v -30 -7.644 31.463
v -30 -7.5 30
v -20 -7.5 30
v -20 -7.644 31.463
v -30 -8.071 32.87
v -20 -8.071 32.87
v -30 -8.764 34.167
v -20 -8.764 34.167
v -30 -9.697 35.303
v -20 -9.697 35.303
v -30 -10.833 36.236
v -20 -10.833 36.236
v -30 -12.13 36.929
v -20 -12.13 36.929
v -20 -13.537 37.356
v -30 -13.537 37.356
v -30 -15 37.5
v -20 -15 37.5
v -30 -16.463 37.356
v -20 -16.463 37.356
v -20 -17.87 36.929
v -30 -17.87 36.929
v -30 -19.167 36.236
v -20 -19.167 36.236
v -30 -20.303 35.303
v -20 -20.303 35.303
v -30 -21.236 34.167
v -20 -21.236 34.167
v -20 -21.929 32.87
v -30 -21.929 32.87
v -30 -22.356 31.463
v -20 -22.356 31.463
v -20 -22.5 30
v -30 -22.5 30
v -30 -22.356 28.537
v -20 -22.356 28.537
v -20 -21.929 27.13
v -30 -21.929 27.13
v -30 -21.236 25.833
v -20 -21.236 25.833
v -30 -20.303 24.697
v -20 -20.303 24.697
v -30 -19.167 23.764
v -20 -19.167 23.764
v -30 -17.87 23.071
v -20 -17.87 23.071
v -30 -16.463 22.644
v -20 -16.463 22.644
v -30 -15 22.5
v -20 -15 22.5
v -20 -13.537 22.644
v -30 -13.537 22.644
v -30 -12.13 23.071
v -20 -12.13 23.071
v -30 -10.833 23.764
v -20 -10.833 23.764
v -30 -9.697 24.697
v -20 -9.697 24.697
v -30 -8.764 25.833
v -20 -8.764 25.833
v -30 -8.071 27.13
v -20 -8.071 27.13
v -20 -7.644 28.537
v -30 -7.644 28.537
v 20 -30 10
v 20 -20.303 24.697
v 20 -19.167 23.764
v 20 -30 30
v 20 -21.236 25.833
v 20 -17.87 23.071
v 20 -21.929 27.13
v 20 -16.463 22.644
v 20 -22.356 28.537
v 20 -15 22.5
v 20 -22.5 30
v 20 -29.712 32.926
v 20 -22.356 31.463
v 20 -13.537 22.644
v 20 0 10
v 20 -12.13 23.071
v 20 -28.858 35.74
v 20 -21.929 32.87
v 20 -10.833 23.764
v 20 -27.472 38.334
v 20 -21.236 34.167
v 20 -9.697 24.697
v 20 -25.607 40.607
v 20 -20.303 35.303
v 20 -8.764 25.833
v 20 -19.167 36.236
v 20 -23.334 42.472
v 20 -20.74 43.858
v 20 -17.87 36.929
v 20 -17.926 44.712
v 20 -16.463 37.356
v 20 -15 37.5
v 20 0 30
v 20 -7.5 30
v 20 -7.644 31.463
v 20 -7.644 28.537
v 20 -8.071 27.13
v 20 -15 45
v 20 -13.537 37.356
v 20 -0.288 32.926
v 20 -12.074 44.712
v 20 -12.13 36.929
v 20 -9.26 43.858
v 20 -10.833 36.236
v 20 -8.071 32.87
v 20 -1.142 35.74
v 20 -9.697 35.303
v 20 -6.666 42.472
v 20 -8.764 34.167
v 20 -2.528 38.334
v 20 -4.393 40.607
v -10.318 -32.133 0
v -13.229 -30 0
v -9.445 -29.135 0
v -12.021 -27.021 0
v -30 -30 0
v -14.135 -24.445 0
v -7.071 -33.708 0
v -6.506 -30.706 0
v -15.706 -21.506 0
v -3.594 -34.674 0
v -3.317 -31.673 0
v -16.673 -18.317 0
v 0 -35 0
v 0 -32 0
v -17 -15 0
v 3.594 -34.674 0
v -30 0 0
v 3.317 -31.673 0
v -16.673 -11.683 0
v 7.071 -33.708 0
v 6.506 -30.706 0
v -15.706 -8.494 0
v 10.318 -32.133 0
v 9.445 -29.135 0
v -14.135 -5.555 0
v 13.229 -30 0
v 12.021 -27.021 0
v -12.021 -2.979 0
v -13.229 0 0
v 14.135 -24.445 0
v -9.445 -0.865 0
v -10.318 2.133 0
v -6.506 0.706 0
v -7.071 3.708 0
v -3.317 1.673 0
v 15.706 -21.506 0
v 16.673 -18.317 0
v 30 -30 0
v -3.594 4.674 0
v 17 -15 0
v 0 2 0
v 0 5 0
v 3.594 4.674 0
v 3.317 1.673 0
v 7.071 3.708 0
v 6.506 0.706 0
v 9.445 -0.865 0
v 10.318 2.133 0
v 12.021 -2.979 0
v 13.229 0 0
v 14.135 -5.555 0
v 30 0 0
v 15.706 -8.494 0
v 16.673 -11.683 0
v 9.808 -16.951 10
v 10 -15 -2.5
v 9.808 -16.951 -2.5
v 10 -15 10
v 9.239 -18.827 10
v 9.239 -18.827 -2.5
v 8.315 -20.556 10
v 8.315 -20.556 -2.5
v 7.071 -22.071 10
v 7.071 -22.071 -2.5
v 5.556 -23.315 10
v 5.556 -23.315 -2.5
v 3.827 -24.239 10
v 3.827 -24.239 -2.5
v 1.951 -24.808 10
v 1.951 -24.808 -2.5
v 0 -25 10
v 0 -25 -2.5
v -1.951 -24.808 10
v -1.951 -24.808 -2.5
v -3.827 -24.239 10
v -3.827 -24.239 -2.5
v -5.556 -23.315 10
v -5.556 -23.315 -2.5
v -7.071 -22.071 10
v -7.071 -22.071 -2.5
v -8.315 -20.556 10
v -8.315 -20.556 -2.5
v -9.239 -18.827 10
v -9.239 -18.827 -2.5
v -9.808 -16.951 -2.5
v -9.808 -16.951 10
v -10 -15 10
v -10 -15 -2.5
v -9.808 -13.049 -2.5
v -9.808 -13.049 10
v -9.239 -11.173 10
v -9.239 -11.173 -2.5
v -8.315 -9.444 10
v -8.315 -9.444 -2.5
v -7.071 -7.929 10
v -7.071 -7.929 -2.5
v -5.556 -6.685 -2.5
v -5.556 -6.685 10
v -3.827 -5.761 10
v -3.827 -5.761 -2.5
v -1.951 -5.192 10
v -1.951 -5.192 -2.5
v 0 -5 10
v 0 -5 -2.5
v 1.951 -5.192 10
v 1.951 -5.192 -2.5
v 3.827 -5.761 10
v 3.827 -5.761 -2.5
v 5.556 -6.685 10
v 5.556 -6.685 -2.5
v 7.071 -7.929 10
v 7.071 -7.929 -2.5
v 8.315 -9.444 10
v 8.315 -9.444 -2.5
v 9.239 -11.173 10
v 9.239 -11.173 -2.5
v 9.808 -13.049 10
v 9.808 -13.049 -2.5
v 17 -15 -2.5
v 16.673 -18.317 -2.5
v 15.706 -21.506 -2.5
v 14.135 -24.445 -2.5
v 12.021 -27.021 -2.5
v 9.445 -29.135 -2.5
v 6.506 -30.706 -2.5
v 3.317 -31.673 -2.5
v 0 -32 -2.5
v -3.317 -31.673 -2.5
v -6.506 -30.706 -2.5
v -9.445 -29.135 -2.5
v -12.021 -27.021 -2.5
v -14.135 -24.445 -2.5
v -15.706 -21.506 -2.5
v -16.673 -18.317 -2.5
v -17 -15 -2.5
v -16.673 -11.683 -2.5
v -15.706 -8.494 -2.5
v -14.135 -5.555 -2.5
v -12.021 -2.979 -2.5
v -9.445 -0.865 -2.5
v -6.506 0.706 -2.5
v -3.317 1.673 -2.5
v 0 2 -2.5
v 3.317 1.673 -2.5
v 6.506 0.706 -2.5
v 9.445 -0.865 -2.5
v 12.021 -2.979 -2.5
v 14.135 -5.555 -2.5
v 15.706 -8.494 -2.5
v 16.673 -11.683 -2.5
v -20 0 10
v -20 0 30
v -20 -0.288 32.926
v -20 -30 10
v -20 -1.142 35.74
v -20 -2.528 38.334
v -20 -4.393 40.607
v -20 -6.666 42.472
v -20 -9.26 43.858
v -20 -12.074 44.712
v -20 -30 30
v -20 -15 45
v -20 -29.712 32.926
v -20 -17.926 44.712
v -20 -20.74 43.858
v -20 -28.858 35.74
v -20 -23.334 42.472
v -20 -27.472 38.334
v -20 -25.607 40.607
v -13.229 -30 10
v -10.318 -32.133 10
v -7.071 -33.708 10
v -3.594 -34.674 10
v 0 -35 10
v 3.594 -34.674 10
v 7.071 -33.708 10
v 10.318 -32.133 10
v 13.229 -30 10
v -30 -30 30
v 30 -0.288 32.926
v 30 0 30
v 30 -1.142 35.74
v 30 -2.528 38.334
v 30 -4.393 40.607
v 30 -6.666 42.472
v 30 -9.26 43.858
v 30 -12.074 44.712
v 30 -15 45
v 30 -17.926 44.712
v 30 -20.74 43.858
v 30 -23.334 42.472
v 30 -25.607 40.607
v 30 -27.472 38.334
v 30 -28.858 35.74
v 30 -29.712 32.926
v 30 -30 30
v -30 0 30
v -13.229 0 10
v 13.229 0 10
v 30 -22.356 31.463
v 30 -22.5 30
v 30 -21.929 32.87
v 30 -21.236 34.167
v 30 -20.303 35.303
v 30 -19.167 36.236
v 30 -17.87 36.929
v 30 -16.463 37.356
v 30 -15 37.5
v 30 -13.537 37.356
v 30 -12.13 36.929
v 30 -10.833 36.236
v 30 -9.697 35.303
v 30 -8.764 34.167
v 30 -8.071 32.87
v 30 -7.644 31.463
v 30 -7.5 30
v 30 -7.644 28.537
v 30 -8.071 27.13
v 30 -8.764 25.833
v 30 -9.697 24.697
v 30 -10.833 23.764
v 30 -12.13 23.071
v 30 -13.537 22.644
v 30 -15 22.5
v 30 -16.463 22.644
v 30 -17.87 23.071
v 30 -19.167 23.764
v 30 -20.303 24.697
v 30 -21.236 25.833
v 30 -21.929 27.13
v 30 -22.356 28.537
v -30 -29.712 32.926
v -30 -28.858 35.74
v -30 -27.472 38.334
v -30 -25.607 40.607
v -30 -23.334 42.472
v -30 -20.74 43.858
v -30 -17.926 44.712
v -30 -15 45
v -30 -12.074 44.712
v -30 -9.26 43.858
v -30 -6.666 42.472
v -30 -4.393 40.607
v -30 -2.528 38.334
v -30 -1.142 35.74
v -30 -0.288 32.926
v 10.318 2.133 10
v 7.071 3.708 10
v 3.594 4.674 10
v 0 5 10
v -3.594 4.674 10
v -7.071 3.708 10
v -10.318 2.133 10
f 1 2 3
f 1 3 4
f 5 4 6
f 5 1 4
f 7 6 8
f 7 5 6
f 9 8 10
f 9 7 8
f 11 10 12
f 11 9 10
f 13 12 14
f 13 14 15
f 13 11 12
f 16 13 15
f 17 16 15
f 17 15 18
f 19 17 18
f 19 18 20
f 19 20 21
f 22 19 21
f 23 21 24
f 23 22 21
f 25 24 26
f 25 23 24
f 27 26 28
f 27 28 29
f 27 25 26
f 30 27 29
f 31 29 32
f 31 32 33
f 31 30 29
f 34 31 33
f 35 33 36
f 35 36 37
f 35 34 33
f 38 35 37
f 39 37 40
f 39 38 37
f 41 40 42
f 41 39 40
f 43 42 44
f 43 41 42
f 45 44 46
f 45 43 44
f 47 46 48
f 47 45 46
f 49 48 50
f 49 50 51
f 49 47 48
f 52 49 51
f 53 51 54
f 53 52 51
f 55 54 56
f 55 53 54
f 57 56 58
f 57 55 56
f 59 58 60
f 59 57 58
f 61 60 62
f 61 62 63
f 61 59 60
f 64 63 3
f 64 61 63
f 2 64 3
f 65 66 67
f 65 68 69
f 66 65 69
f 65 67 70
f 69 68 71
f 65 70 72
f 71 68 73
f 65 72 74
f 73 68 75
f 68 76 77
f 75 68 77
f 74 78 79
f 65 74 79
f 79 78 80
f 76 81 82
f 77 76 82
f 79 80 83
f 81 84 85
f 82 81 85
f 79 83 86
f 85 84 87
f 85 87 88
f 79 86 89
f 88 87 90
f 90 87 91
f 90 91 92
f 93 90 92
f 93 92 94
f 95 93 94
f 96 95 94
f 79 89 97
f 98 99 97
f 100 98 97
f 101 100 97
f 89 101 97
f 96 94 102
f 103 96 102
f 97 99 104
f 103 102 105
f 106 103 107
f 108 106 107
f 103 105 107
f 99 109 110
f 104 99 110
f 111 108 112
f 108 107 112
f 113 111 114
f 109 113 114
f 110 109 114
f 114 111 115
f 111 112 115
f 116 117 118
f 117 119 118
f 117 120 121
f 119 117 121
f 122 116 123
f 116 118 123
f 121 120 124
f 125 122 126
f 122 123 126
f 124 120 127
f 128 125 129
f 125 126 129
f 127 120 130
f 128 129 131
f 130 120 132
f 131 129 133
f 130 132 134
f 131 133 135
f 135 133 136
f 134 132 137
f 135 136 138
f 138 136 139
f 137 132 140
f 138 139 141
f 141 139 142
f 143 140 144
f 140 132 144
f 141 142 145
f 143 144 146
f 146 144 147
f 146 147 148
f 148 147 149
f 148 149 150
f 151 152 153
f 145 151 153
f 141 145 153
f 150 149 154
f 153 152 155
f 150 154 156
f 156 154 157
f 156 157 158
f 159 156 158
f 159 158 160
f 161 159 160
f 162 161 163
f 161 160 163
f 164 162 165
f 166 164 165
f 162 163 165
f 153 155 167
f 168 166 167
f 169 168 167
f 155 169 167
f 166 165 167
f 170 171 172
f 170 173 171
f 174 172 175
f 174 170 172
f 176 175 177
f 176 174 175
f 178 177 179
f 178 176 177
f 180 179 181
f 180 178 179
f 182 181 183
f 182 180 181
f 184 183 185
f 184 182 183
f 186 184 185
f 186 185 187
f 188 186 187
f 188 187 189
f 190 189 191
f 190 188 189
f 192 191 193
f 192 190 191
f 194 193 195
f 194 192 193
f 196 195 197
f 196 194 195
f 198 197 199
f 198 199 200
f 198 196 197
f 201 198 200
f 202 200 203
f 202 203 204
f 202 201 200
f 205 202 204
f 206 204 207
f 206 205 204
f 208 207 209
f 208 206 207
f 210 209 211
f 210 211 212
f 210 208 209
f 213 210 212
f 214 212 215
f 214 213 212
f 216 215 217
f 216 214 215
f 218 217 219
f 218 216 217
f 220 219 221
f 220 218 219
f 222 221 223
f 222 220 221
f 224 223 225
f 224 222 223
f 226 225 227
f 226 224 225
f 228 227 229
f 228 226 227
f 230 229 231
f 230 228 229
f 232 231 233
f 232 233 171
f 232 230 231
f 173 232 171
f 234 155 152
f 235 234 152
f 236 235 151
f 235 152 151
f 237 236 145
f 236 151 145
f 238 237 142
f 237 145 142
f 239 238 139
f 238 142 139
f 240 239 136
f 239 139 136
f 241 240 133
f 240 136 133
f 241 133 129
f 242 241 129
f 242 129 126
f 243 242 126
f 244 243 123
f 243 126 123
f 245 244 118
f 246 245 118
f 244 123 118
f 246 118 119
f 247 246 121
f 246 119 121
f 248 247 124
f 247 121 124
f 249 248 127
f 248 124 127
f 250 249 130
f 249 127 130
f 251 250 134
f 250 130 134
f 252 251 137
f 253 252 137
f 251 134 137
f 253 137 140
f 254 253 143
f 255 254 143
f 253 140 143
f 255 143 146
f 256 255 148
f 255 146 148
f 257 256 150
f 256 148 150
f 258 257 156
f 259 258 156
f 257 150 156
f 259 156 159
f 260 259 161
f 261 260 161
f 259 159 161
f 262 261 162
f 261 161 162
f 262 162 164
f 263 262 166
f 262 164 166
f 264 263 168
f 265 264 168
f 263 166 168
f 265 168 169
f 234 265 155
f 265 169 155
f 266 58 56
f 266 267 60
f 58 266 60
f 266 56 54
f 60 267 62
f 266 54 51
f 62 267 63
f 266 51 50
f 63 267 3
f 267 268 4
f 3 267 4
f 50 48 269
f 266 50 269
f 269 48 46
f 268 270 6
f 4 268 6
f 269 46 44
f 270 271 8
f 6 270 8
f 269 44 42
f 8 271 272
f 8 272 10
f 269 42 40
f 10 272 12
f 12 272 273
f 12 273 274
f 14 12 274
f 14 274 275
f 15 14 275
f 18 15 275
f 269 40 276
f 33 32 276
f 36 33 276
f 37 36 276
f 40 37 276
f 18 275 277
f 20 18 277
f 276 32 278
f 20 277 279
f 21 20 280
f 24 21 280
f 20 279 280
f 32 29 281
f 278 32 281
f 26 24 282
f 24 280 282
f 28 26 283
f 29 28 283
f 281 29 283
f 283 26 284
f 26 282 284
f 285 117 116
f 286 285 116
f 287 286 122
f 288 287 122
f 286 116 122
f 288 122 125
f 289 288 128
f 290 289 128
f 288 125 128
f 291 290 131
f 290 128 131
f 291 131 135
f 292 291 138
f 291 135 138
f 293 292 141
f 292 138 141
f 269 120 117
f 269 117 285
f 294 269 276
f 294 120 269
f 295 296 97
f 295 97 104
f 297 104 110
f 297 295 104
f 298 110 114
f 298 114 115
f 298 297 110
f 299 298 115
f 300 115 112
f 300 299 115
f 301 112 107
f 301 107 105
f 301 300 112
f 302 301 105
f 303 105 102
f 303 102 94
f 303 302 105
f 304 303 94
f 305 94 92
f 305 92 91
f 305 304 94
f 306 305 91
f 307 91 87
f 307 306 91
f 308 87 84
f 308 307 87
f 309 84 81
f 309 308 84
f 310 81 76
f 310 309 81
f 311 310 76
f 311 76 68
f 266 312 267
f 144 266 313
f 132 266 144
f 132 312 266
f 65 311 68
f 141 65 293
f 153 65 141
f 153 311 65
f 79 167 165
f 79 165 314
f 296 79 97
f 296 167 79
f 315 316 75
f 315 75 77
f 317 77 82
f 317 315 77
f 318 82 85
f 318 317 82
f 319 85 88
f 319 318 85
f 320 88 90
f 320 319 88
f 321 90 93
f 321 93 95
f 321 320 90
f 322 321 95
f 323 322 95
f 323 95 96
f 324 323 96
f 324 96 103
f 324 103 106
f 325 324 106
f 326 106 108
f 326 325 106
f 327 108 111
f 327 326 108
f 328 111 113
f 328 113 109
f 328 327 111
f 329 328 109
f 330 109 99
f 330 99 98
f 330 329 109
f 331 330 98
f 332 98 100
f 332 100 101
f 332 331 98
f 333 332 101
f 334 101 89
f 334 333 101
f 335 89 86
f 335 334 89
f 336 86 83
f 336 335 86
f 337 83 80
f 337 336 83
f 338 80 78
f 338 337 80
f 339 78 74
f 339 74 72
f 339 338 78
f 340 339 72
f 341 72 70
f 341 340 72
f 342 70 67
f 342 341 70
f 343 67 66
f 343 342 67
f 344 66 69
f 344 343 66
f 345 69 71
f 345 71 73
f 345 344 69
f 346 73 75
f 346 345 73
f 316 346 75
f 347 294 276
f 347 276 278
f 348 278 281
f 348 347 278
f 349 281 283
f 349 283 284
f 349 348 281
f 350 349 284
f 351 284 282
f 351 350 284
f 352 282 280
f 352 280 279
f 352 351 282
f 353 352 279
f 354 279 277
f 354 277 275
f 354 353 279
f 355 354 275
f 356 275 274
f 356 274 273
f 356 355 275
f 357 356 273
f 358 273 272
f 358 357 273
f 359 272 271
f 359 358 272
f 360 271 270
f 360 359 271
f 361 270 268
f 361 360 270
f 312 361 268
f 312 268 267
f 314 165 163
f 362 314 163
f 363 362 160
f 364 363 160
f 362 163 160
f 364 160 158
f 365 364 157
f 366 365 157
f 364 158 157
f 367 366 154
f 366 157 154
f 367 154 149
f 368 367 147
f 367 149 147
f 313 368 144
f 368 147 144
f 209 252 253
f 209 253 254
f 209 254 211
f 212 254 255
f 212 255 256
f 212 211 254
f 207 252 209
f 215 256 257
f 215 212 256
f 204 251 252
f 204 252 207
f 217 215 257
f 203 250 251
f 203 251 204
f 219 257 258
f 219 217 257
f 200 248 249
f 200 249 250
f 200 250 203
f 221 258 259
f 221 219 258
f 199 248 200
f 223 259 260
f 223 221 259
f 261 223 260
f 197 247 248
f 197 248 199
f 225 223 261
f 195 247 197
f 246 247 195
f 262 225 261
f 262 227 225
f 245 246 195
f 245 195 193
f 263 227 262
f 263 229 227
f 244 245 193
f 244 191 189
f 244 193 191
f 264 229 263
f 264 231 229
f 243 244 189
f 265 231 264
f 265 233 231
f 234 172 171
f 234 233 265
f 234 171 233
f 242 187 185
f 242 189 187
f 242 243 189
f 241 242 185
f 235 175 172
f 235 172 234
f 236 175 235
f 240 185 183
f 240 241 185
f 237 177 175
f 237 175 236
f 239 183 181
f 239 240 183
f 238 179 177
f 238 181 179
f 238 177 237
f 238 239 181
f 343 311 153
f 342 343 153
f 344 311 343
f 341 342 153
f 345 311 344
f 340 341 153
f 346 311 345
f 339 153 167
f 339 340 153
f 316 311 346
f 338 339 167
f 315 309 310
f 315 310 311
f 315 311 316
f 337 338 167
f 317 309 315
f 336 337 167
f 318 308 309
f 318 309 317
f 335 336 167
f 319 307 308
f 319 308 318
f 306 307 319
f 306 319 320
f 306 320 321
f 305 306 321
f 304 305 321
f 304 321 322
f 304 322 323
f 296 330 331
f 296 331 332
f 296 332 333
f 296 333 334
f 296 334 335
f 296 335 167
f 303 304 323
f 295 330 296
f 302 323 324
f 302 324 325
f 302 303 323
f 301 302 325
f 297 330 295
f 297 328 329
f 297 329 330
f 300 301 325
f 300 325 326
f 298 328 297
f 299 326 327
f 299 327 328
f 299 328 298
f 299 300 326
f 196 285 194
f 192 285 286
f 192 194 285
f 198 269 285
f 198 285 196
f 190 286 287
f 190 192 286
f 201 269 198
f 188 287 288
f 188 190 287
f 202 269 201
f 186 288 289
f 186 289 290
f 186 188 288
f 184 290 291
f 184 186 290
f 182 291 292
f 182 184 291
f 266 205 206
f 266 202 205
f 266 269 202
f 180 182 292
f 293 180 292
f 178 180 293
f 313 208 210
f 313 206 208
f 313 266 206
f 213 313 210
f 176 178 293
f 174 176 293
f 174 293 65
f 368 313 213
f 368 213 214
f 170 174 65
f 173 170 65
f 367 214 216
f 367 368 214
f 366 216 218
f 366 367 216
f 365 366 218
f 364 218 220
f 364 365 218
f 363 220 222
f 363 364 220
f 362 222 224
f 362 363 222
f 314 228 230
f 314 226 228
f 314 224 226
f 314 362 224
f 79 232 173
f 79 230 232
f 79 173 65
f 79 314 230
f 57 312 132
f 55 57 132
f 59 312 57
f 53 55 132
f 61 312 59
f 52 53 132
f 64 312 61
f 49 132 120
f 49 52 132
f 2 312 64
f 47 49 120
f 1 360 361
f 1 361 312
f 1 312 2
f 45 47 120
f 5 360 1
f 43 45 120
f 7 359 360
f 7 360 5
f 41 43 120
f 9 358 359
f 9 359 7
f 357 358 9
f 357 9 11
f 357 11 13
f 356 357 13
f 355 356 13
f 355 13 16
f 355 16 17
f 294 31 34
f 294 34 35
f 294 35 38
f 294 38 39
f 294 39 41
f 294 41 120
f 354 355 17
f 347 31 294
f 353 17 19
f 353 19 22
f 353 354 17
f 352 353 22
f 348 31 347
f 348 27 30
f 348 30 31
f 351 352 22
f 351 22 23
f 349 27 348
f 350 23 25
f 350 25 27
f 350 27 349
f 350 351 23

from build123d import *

# Parameters (mm, degrees)
F0_R     = 10
F1_DEPTH = 10
F3_DEPTH = 10
F5_DEPTH = 10
F6_R     = 17
F6_R_2   = 10
F7_DEPTH = 2.5


with BuildPart() as f1:
    # F0 (on Top) → F1 (new body)
    with BuildSketch(Plane.XY):
        with BuildLine():
            Line((13.2287565553, 0), (0, 0))
            Line((0, 0), (-13.2287565553, 0))
            ThreePointArc((-13.2287565553, 0), (-20, -15), (-13.2287565553, -30))
            Line((-13.2287565553, -30), (13.2287565553, -30))
            ThreePointArc((13.2287565553, -30), (18.2287565553, -23.2287565553), (20, -15))
            ThreePointArc((20, -15), (18.2287565553, -6.7712434447), (13.2287565553, 0))
        make_face()
        with Locations((0, -15)):
            Circle(F0_R, mode=Mode.SUBTRACT)
        with BuildLine():
            Line((-13.2287565553, 0), (0, 0))
            Line((0, 0), (13.2287565553, 0))
            ThreePointArc((13.2287565553, 0), (0, 5), (-13.2287565553, 0))
        make_face()
        with BuildLine():
            ThreePointArc((-13.2287565553, -30), (-20, -15), (-13.2287565553, 0))
            Line((-13.2287565553, 0), (-30, 0))
            Line((-30, 0), (-30, -30))
            Line((-30, -30), (-13.2287565553, -30))
        make_face()
        with BuildLine():
            Line((30, 0), (13.2287565553, 0))
            ThreePointArc((13.2287565553, 0), (18.2287565553, -6.7712434447), (20, -15))
            ThreePointArc((20, -15), (18.2287565553, -23.2287565553), (13.2287565553, -30))
            Line((13.2287565553, -30), (30, -30))
            Line((30, -30), (30, 0))
        make_face()
        with BuildLine():
            Line((13.2287565553, -30), (-13.2287565553, -30))
            ThreePointArc((-13.2287565553, -30), (0, -35), (13.2287565553, -30))
        make_face()
    extrude(amount=F1_DEPTH)

    # F2 (on face) → F3 (join)
    with BuildSketch(Plane.YZ.offset(30)):
        with BuildLine():
            Line((-30, 30), (-30, 10))
            Line((-30, 10), (0, 10))
            Line((0, 10), (0, 30))
            Line((0, 30), (-7.5, 30))
            ThreePointArc((-7.5, 30), (-15, 22.5), (-22.5, 30))
            Line((-22.5, 30), (-30, 30))
        make_face()
        with BuildLine():
            ThreePointArc((0, 30), (-15, 45), (-30, 30))
            Line((-30, 30), (-22.5, 30))
            ThreePointArc((-22.5, 30), (-15, 37.5), (-7.5, 30))
            Line((-7.5, 30), (0, 30))
        make_face()
    extrude(amount=-F3_DEPTH)

    # F4 (on face) → F5 (join)
    with BuildSketch(Plane(origin=(-30, 0, 0), x_dir=(0, -1, 0), z_dir=(-1, 0, 0))):
        with BuildLine():
            Line((0, 30), (0, 10))
            Line((0, 10), (30, 10))
            Line((30, 10), (30, 30))
            Line((30, 30), (22.5, 30))
            ThreePointArc((22.5, 30), (15, 22.5), (7.5, 30))
            Line((7.5, 30), (0, 30))
        make_face()
        with BuildLine():
            ThreePointArc((30, 30), (15, 45), (0, 30))
            Line((0, 30), (7.5, 30))
            ThreePointArc((7.5, 30), (15, 37.5), (22.5, 30))
            Line((22.5, 30), (30, 30))
        make_face()
    extrude(amount=-F5_DEPTH)

    # F6 (on face) → F7 (join)
    with BuildSketch(Plane(origin=(0, 0, 0), x_dir=(1, 0, 0), z_dir=(0, 0, -1))):
        with Locations((0, 15)):
            Circle(F6_R)
        with Locations((0, 15)):
            Circle(F6_R_2, mode=Mode.SUBTRACT)
    extrude(amount=F7_DEPTH)


solid = f1.part
